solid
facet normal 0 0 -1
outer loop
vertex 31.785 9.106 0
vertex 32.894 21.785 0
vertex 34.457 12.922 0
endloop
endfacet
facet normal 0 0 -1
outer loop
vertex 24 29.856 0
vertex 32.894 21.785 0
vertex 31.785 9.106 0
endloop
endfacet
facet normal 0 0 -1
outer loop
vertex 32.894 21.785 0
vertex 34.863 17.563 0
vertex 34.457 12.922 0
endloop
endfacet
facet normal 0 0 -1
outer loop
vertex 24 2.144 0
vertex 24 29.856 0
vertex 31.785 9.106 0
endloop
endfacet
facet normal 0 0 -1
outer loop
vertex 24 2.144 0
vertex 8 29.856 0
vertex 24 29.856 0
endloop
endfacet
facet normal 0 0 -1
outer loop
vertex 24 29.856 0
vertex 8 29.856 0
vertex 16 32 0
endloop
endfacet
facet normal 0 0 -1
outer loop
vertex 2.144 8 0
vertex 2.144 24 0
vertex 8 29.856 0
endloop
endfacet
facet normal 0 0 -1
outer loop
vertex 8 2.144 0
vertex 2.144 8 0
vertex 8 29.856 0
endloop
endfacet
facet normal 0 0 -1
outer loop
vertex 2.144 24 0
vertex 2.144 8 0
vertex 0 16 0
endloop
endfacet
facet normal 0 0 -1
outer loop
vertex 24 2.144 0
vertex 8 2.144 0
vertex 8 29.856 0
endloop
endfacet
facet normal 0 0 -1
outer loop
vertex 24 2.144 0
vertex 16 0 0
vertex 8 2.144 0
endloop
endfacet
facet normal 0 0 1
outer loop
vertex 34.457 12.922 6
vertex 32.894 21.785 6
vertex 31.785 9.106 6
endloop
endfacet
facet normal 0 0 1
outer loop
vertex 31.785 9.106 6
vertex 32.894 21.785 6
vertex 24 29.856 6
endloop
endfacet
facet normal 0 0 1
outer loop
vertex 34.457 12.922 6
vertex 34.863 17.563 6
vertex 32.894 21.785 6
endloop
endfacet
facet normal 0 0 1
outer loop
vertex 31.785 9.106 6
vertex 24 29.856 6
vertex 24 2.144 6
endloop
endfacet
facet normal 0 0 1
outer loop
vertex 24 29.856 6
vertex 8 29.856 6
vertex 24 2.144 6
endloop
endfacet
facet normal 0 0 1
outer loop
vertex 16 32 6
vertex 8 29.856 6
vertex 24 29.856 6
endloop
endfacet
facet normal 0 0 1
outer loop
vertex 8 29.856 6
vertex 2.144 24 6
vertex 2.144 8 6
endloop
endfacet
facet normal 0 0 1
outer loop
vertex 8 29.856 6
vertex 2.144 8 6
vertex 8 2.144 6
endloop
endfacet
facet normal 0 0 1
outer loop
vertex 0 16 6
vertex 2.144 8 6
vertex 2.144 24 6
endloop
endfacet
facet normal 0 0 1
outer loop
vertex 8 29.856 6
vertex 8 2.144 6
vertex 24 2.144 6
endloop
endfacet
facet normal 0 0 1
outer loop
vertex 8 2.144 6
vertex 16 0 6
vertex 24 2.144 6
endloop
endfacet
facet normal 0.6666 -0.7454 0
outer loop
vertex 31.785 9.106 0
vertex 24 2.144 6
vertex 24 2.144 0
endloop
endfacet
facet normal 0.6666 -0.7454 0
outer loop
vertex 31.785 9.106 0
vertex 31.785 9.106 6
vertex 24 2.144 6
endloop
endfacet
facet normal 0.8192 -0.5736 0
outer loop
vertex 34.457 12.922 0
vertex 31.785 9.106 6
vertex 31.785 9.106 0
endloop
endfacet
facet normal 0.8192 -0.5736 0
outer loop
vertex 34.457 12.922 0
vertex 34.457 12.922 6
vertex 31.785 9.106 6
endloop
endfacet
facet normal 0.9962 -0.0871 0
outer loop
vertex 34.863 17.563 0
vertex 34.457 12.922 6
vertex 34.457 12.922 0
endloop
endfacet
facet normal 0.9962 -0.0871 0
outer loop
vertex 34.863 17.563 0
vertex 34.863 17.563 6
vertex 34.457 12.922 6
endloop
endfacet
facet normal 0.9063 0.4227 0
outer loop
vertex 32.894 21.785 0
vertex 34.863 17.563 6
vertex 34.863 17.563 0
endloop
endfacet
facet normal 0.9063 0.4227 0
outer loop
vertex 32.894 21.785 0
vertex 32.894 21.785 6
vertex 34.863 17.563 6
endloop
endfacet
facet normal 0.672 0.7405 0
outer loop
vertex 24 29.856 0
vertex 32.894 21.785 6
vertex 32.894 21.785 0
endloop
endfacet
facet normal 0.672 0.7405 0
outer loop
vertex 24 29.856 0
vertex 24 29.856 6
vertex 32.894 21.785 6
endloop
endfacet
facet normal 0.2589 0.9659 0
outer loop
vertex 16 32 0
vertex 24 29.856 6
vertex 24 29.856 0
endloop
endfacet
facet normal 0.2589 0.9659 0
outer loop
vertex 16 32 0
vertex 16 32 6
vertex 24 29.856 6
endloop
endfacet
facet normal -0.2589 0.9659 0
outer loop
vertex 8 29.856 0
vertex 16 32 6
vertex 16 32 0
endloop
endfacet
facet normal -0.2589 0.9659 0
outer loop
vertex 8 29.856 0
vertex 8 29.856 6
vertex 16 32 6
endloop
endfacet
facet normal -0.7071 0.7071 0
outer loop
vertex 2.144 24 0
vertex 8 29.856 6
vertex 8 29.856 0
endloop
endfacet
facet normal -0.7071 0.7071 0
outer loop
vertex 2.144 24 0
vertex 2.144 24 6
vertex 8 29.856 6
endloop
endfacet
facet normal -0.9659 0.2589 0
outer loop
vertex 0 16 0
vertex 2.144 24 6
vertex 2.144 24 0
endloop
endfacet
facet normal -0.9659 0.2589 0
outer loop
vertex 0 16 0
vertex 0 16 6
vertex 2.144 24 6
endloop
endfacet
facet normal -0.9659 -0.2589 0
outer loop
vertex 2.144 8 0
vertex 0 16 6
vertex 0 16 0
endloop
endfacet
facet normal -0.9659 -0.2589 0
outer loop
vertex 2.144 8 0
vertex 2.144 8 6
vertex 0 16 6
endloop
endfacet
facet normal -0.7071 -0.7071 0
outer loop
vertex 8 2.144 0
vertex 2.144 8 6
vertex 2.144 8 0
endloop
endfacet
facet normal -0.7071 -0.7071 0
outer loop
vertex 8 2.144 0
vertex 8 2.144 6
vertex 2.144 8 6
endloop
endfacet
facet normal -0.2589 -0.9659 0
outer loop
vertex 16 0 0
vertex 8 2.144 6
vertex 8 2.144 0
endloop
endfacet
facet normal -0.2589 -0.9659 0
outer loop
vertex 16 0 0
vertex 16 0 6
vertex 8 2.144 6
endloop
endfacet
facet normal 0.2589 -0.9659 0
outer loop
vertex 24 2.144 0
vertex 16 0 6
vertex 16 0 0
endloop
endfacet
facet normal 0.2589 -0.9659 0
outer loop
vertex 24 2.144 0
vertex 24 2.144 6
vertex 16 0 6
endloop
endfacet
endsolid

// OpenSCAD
$fn = 32;

// ----------------------------------------------------------------------
// Eccentric disc: step, 6 mm thick
// ----------------------------------------------------------------------

// --- parameters (mm) ---
profile_height = 6;       // extrusion height
profile_points = 13;      // points of the closed outline

profile = [[0, 16], [2.144, 8], [8, 2.144], [16, 0], [24, 2.144], [31.785, 9.106], [34.457, 12.922], [34.863, 17.563], [32.894, 21.785], [24, 29.856], [16, 32], [8, 29.856], [2.144, 24]];  // single closed polygon, 13 points, counter clockwise

// --- the one profile operation ---
linear_extrude(height = profile_height) polygon(points = profile);
